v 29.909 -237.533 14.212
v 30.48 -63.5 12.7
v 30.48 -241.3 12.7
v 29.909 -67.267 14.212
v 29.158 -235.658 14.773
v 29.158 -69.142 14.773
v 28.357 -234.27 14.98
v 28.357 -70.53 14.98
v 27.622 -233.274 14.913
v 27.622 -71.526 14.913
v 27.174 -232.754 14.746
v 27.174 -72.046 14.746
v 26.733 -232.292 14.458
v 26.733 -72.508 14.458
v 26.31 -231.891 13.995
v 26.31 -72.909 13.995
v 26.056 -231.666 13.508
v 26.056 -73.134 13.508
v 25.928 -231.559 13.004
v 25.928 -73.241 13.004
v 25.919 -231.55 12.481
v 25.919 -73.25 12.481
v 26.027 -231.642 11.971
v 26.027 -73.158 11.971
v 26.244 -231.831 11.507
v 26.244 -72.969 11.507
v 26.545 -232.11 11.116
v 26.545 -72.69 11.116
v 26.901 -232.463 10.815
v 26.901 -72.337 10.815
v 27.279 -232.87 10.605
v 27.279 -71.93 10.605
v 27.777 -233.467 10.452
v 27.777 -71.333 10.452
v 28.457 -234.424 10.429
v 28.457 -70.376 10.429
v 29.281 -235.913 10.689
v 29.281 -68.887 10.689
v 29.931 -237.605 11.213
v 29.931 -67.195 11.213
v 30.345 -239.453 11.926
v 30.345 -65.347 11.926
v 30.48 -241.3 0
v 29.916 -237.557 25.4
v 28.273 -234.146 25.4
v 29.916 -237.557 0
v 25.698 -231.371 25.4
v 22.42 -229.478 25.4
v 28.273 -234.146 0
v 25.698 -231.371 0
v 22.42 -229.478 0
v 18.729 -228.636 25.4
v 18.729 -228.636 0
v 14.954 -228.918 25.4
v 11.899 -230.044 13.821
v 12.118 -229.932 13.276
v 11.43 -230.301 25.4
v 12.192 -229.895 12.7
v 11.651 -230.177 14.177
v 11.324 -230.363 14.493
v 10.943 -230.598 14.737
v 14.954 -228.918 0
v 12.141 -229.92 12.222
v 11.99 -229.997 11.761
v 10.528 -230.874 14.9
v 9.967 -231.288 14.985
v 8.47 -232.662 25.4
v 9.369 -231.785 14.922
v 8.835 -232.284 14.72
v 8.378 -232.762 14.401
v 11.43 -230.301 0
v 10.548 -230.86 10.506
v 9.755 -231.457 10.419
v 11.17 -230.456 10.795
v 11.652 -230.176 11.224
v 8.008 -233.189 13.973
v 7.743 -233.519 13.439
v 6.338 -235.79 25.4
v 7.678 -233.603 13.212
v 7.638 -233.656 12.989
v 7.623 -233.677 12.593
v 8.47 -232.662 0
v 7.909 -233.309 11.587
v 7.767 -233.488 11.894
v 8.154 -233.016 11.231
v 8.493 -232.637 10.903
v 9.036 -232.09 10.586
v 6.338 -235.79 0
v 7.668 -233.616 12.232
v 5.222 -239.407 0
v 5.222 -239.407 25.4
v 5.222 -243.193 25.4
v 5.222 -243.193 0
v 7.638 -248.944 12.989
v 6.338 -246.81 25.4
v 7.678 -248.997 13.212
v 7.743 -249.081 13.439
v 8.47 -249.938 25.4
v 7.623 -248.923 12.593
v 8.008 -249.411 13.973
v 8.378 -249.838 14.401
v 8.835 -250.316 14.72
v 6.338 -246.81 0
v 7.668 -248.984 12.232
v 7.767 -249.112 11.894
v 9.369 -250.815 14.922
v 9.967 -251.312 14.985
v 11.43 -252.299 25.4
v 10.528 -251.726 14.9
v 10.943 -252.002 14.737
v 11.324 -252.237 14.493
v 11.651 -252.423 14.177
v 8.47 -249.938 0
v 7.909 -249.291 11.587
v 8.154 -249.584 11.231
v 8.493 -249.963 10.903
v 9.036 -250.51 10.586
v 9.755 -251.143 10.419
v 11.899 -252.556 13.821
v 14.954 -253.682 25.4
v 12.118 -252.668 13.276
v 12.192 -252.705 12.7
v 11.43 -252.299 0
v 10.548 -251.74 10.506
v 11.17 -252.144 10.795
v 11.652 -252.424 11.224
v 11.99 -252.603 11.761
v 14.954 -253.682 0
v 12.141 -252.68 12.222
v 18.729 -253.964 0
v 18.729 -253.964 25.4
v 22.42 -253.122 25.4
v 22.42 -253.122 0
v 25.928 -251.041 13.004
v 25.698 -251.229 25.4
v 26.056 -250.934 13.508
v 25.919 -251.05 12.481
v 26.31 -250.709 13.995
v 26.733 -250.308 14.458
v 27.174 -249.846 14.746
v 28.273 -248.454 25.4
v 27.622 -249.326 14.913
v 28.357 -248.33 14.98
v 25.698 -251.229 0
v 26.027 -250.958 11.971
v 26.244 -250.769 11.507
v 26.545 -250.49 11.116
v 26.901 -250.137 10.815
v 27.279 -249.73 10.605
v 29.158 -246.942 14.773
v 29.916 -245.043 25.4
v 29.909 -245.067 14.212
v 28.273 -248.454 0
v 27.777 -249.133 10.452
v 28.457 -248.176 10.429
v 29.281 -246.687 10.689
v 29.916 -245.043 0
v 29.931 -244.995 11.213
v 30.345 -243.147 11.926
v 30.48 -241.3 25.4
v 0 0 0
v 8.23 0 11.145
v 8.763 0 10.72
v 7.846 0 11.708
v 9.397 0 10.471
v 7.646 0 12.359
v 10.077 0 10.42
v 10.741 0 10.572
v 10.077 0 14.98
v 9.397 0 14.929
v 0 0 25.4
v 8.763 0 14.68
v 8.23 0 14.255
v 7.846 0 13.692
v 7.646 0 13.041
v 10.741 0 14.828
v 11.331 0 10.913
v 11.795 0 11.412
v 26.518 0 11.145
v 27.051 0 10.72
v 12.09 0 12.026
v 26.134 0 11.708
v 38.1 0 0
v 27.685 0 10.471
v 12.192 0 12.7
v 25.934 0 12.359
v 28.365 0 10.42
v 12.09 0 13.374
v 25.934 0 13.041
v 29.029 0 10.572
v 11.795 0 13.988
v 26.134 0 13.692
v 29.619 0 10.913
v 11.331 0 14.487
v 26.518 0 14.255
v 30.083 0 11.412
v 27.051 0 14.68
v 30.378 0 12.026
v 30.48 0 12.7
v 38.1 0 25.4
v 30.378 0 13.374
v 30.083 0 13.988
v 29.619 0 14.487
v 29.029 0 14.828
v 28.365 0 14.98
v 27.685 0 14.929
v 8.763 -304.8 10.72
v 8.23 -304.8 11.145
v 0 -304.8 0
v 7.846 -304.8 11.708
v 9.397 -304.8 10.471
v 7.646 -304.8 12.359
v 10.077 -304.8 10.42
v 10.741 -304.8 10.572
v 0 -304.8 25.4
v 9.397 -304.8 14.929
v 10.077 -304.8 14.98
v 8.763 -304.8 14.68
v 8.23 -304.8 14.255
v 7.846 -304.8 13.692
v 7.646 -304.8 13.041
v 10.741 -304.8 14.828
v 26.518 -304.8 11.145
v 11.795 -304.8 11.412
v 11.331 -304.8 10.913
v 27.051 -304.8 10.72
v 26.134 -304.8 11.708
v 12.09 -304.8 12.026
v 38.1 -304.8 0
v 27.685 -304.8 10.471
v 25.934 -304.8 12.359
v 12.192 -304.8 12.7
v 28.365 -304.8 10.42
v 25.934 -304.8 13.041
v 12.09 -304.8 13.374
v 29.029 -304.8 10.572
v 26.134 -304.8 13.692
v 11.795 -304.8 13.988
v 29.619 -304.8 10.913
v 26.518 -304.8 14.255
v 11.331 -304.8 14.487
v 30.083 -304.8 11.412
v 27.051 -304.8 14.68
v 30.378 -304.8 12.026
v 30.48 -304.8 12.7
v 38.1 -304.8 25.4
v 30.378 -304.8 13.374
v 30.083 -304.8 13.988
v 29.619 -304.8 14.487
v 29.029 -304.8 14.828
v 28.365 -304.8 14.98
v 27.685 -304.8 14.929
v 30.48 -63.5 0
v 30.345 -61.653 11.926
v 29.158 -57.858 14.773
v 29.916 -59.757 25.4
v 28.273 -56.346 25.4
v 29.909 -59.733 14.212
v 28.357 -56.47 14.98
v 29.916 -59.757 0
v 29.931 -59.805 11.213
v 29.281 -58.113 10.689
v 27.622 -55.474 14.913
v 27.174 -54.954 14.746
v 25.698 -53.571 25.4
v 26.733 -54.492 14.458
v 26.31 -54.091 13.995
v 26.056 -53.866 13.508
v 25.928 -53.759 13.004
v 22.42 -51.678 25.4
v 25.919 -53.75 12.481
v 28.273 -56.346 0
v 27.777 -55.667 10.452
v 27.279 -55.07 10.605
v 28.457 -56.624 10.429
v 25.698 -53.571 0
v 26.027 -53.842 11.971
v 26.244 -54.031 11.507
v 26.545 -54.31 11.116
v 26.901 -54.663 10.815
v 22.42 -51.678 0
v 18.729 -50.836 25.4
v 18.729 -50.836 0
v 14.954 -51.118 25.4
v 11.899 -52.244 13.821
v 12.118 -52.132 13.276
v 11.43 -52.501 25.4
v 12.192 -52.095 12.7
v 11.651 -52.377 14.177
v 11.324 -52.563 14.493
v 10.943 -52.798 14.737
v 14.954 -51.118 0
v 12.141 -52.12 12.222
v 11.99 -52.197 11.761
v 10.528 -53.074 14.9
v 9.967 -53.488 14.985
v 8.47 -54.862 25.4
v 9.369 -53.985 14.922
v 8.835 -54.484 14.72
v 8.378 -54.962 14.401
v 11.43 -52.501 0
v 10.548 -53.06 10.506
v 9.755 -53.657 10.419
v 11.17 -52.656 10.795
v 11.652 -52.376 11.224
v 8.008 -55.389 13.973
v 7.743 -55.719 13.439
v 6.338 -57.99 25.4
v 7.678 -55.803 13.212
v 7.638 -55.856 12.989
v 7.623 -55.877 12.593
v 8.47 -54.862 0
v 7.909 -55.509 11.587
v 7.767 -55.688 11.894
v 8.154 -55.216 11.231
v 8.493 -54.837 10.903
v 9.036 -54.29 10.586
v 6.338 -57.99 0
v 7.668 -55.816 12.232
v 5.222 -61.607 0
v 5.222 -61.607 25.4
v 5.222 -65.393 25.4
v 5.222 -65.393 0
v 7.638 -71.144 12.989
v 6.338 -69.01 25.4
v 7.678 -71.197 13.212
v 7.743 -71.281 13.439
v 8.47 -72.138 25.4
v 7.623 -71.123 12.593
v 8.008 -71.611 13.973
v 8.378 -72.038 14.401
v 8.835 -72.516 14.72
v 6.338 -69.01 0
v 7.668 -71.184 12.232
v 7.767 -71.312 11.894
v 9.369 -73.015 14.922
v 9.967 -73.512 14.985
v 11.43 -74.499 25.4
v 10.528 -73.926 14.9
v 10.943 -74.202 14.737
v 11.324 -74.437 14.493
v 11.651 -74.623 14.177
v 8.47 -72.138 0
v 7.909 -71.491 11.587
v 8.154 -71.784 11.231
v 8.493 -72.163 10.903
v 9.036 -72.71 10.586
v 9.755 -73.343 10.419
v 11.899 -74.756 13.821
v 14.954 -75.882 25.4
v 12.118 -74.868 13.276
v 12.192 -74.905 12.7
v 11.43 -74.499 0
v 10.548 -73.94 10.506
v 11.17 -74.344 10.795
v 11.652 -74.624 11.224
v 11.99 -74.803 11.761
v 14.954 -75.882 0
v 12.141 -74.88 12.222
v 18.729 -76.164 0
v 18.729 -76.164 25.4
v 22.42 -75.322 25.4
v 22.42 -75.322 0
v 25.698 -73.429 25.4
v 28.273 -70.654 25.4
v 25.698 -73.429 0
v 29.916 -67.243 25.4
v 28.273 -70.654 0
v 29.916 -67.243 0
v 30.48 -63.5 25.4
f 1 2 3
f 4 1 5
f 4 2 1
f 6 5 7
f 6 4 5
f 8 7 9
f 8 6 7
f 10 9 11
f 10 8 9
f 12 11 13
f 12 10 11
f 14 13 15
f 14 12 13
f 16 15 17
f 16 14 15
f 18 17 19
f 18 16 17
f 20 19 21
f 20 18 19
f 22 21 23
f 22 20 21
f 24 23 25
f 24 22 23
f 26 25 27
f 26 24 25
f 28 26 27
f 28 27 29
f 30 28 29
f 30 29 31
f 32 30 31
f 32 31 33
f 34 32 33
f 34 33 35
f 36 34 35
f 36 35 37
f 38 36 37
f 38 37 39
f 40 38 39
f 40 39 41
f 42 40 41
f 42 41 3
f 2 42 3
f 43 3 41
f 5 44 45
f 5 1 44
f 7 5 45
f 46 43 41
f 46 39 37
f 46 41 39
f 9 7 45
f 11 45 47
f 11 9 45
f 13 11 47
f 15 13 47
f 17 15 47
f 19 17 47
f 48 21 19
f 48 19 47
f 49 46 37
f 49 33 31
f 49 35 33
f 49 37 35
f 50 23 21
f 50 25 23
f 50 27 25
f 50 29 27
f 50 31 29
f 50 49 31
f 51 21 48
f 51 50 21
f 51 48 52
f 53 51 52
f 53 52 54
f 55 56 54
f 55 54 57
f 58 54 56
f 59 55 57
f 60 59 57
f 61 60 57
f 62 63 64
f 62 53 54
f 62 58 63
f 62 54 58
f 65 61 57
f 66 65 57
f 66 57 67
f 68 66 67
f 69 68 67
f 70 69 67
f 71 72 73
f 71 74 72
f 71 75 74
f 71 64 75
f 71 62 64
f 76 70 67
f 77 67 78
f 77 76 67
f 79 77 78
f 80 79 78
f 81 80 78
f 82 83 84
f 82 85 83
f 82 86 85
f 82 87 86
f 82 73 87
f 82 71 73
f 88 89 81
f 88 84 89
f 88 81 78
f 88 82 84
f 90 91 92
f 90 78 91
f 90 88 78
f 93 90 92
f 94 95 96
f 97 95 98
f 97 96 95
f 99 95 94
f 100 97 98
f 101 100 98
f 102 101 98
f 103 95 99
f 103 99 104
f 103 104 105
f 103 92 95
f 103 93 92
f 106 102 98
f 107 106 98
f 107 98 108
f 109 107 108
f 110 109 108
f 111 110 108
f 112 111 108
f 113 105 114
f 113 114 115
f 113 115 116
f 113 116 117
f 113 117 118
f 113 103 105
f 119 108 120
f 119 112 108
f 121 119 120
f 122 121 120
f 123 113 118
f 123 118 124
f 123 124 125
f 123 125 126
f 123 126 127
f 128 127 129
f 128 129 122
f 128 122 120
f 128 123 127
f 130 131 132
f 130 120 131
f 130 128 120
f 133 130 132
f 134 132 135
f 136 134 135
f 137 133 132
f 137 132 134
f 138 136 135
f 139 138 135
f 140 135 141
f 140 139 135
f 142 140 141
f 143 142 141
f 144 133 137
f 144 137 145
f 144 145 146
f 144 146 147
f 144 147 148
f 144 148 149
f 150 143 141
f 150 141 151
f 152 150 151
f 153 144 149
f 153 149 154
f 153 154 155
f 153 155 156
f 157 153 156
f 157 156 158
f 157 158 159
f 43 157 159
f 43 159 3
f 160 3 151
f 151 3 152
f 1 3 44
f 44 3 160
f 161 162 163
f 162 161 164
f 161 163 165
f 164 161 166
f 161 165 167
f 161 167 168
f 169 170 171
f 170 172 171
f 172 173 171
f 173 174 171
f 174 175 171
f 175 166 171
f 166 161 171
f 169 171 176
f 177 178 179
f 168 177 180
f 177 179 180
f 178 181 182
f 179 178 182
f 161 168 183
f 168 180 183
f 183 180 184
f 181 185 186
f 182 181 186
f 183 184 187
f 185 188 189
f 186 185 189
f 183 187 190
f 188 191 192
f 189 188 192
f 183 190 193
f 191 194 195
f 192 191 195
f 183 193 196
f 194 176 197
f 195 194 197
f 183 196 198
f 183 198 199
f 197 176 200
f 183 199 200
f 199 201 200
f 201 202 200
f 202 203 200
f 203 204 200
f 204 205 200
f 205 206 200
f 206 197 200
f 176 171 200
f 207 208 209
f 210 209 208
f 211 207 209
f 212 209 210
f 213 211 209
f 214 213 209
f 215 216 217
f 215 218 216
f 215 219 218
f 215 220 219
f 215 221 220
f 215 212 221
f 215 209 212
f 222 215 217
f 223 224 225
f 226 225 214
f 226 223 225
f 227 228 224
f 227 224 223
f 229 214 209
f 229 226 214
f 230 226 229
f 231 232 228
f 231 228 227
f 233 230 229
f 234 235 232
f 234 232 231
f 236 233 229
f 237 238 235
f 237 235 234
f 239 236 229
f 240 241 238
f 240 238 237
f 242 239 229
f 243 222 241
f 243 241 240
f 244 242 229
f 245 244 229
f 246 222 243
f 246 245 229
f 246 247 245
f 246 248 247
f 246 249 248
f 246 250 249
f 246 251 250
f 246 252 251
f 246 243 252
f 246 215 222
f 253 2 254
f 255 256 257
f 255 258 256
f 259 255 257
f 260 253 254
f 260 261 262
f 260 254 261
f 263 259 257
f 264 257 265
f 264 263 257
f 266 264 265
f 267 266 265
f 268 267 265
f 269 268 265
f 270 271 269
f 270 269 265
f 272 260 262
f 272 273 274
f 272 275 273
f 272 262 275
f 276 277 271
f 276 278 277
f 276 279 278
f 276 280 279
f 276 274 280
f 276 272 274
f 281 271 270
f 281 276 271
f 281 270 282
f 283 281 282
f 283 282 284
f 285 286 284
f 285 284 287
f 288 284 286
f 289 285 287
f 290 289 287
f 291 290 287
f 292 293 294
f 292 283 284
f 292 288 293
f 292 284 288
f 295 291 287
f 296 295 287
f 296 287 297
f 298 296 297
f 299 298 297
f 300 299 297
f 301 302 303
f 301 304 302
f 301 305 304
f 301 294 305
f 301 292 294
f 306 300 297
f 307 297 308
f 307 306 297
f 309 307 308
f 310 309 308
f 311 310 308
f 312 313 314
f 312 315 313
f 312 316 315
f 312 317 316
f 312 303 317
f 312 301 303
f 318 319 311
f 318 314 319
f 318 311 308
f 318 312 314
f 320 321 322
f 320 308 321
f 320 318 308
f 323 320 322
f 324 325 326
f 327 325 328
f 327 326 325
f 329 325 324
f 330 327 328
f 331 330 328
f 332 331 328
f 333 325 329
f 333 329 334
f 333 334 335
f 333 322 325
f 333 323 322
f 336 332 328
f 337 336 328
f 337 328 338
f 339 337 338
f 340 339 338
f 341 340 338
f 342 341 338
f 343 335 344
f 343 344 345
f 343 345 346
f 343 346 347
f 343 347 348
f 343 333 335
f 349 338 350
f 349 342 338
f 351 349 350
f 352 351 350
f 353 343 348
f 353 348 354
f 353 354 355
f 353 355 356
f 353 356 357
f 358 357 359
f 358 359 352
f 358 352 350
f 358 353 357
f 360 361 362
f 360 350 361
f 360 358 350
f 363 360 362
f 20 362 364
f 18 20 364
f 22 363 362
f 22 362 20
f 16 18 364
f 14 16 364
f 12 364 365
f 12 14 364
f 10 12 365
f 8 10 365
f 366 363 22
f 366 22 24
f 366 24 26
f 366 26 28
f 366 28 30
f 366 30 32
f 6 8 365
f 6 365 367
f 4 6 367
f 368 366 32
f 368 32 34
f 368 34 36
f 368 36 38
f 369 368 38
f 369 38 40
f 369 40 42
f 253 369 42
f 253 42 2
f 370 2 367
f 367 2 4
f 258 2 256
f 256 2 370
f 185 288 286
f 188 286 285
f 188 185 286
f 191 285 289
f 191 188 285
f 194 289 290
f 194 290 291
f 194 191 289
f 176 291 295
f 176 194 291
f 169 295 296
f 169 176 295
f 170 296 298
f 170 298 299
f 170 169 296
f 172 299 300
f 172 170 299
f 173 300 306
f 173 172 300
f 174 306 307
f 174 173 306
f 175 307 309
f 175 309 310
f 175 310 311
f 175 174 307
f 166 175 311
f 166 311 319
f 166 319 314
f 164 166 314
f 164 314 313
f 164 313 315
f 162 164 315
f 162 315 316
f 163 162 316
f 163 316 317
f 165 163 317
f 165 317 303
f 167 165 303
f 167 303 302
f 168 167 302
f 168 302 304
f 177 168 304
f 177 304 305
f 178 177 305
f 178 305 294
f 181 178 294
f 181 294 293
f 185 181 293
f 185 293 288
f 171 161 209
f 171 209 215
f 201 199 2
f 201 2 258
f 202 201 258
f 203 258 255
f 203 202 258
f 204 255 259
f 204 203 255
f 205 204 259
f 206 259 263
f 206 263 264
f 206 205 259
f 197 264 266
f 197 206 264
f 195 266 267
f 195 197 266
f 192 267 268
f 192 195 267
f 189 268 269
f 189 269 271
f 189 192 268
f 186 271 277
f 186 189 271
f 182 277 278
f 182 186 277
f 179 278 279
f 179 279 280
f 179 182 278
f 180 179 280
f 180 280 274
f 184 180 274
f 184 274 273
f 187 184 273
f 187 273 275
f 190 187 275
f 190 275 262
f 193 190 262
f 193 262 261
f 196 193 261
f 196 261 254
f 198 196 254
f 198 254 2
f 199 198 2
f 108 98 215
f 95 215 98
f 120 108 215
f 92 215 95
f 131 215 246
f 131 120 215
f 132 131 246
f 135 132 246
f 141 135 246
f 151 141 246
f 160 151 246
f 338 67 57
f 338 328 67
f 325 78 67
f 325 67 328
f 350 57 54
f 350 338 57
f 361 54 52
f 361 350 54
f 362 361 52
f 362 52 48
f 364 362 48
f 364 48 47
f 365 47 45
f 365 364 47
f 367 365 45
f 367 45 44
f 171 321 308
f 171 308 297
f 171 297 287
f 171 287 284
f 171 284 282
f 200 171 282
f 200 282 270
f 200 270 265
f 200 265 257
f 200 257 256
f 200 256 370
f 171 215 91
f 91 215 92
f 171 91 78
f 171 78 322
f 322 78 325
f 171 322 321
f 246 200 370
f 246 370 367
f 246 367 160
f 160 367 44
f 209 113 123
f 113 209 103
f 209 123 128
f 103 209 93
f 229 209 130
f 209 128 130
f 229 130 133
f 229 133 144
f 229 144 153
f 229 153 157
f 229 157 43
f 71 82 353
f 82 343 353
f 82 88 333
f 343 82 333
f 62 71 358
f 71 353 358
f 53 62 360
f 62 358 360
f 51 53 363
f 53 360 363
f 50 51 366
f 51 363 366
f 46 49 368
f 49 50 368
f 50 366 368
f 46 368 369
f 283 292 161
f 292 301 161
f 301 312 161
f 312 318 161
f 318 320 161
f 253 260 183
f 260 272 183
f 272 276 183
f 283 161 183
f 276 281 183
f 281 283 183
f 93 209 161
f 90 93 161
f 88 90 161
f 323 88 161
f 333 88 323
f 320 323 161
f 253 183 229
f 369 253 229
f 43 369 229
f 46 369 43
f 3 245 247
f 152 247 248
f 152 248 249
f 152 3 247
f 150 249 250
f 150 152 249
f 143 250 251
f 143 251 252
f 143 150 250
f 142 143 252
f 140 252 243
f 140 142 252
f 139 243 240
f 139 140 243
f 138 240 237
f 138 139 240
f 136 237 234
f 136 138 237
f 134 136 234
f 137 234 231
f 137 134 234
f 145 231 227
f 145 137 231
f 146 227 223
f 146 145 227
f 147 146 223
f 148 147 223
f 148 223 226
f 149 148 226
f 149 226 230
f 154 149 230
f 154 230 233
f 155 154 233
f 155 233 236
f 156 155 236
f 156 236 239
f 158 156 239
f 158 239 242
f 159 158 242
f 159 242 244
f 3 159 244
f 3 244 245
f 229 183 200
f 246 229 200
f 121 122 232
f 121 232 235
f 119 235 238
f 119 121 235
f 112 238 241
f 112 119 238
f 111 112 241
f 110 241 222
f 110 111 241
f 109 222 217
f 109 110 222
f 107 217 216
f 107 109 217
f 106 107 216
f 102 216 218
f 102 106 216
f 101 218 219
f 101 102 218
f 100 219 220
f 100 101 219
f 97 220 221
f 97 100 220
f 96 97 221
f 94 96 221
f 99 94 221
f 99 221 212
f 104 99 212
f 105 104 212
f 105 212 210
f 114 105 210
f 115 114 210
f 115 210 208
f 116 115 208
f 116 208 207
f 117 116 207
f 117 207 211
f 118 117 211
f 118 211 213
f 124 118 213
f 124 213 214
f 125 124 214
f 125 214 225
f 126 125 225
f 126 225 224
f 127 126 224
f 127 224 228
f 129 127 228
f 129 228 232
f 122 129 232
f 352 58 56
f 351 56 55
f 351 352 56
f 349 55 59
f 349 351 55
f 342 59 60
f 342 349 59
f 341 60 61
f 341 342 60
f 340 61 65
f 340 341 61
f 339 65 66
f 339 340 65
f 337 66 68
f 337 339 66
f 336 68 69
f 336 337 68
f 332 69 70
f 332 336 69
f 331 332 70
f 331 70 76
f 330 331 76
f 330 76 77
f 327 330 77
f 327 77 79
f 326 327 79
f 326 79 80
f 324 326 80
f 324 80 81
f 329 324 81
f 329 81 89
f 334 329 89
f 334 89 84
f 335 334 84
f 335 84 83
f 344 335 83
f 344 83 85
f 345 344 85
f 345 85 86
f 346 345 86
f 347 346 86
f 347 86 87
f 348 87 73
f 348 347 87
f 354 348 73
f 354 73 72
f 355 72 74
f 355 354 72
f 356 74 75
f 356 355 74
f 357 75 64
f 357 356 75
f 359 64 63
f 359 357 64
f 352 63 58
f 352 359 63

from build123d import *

# Parameters (mm, degrees)
F0_W     = 38.1
F0_H     = 25.4
F0_R     = 2.286
F1_DEPTH = 304.8
F2_R     = 12.7
F3_DEPTH = 25.401


with BuildPart() as f1:
    # F0 (on Front) → F1 (new body)
    with BuildSketch(Plane.XZ):
        with Locations((19.05, 12.7)):
            Rectangle(F0_W, F0_H)
        with Locations((9.906, 12.7)):
            Circle(F0_R, mode=Mode.SUBTRACT)
        with Locations((28.194, 12.7)):
            Circle(F0_R, mode=Mode.SUBTRACT)
    extrude(amount=F1_DEPTH)

    # F2 (on Top) → F3 (cut, through all)
    with BuildSketch(Plane.XY):
        with Locations((17.78, -241.3)):
            Circle(F2_R)
        with Locations((17.78, -63.5)):
            Circle(F2_R)
    extrude(amount=F3_DEPTH, mode=Mode.SUBTRACT)


solid = f1.part
